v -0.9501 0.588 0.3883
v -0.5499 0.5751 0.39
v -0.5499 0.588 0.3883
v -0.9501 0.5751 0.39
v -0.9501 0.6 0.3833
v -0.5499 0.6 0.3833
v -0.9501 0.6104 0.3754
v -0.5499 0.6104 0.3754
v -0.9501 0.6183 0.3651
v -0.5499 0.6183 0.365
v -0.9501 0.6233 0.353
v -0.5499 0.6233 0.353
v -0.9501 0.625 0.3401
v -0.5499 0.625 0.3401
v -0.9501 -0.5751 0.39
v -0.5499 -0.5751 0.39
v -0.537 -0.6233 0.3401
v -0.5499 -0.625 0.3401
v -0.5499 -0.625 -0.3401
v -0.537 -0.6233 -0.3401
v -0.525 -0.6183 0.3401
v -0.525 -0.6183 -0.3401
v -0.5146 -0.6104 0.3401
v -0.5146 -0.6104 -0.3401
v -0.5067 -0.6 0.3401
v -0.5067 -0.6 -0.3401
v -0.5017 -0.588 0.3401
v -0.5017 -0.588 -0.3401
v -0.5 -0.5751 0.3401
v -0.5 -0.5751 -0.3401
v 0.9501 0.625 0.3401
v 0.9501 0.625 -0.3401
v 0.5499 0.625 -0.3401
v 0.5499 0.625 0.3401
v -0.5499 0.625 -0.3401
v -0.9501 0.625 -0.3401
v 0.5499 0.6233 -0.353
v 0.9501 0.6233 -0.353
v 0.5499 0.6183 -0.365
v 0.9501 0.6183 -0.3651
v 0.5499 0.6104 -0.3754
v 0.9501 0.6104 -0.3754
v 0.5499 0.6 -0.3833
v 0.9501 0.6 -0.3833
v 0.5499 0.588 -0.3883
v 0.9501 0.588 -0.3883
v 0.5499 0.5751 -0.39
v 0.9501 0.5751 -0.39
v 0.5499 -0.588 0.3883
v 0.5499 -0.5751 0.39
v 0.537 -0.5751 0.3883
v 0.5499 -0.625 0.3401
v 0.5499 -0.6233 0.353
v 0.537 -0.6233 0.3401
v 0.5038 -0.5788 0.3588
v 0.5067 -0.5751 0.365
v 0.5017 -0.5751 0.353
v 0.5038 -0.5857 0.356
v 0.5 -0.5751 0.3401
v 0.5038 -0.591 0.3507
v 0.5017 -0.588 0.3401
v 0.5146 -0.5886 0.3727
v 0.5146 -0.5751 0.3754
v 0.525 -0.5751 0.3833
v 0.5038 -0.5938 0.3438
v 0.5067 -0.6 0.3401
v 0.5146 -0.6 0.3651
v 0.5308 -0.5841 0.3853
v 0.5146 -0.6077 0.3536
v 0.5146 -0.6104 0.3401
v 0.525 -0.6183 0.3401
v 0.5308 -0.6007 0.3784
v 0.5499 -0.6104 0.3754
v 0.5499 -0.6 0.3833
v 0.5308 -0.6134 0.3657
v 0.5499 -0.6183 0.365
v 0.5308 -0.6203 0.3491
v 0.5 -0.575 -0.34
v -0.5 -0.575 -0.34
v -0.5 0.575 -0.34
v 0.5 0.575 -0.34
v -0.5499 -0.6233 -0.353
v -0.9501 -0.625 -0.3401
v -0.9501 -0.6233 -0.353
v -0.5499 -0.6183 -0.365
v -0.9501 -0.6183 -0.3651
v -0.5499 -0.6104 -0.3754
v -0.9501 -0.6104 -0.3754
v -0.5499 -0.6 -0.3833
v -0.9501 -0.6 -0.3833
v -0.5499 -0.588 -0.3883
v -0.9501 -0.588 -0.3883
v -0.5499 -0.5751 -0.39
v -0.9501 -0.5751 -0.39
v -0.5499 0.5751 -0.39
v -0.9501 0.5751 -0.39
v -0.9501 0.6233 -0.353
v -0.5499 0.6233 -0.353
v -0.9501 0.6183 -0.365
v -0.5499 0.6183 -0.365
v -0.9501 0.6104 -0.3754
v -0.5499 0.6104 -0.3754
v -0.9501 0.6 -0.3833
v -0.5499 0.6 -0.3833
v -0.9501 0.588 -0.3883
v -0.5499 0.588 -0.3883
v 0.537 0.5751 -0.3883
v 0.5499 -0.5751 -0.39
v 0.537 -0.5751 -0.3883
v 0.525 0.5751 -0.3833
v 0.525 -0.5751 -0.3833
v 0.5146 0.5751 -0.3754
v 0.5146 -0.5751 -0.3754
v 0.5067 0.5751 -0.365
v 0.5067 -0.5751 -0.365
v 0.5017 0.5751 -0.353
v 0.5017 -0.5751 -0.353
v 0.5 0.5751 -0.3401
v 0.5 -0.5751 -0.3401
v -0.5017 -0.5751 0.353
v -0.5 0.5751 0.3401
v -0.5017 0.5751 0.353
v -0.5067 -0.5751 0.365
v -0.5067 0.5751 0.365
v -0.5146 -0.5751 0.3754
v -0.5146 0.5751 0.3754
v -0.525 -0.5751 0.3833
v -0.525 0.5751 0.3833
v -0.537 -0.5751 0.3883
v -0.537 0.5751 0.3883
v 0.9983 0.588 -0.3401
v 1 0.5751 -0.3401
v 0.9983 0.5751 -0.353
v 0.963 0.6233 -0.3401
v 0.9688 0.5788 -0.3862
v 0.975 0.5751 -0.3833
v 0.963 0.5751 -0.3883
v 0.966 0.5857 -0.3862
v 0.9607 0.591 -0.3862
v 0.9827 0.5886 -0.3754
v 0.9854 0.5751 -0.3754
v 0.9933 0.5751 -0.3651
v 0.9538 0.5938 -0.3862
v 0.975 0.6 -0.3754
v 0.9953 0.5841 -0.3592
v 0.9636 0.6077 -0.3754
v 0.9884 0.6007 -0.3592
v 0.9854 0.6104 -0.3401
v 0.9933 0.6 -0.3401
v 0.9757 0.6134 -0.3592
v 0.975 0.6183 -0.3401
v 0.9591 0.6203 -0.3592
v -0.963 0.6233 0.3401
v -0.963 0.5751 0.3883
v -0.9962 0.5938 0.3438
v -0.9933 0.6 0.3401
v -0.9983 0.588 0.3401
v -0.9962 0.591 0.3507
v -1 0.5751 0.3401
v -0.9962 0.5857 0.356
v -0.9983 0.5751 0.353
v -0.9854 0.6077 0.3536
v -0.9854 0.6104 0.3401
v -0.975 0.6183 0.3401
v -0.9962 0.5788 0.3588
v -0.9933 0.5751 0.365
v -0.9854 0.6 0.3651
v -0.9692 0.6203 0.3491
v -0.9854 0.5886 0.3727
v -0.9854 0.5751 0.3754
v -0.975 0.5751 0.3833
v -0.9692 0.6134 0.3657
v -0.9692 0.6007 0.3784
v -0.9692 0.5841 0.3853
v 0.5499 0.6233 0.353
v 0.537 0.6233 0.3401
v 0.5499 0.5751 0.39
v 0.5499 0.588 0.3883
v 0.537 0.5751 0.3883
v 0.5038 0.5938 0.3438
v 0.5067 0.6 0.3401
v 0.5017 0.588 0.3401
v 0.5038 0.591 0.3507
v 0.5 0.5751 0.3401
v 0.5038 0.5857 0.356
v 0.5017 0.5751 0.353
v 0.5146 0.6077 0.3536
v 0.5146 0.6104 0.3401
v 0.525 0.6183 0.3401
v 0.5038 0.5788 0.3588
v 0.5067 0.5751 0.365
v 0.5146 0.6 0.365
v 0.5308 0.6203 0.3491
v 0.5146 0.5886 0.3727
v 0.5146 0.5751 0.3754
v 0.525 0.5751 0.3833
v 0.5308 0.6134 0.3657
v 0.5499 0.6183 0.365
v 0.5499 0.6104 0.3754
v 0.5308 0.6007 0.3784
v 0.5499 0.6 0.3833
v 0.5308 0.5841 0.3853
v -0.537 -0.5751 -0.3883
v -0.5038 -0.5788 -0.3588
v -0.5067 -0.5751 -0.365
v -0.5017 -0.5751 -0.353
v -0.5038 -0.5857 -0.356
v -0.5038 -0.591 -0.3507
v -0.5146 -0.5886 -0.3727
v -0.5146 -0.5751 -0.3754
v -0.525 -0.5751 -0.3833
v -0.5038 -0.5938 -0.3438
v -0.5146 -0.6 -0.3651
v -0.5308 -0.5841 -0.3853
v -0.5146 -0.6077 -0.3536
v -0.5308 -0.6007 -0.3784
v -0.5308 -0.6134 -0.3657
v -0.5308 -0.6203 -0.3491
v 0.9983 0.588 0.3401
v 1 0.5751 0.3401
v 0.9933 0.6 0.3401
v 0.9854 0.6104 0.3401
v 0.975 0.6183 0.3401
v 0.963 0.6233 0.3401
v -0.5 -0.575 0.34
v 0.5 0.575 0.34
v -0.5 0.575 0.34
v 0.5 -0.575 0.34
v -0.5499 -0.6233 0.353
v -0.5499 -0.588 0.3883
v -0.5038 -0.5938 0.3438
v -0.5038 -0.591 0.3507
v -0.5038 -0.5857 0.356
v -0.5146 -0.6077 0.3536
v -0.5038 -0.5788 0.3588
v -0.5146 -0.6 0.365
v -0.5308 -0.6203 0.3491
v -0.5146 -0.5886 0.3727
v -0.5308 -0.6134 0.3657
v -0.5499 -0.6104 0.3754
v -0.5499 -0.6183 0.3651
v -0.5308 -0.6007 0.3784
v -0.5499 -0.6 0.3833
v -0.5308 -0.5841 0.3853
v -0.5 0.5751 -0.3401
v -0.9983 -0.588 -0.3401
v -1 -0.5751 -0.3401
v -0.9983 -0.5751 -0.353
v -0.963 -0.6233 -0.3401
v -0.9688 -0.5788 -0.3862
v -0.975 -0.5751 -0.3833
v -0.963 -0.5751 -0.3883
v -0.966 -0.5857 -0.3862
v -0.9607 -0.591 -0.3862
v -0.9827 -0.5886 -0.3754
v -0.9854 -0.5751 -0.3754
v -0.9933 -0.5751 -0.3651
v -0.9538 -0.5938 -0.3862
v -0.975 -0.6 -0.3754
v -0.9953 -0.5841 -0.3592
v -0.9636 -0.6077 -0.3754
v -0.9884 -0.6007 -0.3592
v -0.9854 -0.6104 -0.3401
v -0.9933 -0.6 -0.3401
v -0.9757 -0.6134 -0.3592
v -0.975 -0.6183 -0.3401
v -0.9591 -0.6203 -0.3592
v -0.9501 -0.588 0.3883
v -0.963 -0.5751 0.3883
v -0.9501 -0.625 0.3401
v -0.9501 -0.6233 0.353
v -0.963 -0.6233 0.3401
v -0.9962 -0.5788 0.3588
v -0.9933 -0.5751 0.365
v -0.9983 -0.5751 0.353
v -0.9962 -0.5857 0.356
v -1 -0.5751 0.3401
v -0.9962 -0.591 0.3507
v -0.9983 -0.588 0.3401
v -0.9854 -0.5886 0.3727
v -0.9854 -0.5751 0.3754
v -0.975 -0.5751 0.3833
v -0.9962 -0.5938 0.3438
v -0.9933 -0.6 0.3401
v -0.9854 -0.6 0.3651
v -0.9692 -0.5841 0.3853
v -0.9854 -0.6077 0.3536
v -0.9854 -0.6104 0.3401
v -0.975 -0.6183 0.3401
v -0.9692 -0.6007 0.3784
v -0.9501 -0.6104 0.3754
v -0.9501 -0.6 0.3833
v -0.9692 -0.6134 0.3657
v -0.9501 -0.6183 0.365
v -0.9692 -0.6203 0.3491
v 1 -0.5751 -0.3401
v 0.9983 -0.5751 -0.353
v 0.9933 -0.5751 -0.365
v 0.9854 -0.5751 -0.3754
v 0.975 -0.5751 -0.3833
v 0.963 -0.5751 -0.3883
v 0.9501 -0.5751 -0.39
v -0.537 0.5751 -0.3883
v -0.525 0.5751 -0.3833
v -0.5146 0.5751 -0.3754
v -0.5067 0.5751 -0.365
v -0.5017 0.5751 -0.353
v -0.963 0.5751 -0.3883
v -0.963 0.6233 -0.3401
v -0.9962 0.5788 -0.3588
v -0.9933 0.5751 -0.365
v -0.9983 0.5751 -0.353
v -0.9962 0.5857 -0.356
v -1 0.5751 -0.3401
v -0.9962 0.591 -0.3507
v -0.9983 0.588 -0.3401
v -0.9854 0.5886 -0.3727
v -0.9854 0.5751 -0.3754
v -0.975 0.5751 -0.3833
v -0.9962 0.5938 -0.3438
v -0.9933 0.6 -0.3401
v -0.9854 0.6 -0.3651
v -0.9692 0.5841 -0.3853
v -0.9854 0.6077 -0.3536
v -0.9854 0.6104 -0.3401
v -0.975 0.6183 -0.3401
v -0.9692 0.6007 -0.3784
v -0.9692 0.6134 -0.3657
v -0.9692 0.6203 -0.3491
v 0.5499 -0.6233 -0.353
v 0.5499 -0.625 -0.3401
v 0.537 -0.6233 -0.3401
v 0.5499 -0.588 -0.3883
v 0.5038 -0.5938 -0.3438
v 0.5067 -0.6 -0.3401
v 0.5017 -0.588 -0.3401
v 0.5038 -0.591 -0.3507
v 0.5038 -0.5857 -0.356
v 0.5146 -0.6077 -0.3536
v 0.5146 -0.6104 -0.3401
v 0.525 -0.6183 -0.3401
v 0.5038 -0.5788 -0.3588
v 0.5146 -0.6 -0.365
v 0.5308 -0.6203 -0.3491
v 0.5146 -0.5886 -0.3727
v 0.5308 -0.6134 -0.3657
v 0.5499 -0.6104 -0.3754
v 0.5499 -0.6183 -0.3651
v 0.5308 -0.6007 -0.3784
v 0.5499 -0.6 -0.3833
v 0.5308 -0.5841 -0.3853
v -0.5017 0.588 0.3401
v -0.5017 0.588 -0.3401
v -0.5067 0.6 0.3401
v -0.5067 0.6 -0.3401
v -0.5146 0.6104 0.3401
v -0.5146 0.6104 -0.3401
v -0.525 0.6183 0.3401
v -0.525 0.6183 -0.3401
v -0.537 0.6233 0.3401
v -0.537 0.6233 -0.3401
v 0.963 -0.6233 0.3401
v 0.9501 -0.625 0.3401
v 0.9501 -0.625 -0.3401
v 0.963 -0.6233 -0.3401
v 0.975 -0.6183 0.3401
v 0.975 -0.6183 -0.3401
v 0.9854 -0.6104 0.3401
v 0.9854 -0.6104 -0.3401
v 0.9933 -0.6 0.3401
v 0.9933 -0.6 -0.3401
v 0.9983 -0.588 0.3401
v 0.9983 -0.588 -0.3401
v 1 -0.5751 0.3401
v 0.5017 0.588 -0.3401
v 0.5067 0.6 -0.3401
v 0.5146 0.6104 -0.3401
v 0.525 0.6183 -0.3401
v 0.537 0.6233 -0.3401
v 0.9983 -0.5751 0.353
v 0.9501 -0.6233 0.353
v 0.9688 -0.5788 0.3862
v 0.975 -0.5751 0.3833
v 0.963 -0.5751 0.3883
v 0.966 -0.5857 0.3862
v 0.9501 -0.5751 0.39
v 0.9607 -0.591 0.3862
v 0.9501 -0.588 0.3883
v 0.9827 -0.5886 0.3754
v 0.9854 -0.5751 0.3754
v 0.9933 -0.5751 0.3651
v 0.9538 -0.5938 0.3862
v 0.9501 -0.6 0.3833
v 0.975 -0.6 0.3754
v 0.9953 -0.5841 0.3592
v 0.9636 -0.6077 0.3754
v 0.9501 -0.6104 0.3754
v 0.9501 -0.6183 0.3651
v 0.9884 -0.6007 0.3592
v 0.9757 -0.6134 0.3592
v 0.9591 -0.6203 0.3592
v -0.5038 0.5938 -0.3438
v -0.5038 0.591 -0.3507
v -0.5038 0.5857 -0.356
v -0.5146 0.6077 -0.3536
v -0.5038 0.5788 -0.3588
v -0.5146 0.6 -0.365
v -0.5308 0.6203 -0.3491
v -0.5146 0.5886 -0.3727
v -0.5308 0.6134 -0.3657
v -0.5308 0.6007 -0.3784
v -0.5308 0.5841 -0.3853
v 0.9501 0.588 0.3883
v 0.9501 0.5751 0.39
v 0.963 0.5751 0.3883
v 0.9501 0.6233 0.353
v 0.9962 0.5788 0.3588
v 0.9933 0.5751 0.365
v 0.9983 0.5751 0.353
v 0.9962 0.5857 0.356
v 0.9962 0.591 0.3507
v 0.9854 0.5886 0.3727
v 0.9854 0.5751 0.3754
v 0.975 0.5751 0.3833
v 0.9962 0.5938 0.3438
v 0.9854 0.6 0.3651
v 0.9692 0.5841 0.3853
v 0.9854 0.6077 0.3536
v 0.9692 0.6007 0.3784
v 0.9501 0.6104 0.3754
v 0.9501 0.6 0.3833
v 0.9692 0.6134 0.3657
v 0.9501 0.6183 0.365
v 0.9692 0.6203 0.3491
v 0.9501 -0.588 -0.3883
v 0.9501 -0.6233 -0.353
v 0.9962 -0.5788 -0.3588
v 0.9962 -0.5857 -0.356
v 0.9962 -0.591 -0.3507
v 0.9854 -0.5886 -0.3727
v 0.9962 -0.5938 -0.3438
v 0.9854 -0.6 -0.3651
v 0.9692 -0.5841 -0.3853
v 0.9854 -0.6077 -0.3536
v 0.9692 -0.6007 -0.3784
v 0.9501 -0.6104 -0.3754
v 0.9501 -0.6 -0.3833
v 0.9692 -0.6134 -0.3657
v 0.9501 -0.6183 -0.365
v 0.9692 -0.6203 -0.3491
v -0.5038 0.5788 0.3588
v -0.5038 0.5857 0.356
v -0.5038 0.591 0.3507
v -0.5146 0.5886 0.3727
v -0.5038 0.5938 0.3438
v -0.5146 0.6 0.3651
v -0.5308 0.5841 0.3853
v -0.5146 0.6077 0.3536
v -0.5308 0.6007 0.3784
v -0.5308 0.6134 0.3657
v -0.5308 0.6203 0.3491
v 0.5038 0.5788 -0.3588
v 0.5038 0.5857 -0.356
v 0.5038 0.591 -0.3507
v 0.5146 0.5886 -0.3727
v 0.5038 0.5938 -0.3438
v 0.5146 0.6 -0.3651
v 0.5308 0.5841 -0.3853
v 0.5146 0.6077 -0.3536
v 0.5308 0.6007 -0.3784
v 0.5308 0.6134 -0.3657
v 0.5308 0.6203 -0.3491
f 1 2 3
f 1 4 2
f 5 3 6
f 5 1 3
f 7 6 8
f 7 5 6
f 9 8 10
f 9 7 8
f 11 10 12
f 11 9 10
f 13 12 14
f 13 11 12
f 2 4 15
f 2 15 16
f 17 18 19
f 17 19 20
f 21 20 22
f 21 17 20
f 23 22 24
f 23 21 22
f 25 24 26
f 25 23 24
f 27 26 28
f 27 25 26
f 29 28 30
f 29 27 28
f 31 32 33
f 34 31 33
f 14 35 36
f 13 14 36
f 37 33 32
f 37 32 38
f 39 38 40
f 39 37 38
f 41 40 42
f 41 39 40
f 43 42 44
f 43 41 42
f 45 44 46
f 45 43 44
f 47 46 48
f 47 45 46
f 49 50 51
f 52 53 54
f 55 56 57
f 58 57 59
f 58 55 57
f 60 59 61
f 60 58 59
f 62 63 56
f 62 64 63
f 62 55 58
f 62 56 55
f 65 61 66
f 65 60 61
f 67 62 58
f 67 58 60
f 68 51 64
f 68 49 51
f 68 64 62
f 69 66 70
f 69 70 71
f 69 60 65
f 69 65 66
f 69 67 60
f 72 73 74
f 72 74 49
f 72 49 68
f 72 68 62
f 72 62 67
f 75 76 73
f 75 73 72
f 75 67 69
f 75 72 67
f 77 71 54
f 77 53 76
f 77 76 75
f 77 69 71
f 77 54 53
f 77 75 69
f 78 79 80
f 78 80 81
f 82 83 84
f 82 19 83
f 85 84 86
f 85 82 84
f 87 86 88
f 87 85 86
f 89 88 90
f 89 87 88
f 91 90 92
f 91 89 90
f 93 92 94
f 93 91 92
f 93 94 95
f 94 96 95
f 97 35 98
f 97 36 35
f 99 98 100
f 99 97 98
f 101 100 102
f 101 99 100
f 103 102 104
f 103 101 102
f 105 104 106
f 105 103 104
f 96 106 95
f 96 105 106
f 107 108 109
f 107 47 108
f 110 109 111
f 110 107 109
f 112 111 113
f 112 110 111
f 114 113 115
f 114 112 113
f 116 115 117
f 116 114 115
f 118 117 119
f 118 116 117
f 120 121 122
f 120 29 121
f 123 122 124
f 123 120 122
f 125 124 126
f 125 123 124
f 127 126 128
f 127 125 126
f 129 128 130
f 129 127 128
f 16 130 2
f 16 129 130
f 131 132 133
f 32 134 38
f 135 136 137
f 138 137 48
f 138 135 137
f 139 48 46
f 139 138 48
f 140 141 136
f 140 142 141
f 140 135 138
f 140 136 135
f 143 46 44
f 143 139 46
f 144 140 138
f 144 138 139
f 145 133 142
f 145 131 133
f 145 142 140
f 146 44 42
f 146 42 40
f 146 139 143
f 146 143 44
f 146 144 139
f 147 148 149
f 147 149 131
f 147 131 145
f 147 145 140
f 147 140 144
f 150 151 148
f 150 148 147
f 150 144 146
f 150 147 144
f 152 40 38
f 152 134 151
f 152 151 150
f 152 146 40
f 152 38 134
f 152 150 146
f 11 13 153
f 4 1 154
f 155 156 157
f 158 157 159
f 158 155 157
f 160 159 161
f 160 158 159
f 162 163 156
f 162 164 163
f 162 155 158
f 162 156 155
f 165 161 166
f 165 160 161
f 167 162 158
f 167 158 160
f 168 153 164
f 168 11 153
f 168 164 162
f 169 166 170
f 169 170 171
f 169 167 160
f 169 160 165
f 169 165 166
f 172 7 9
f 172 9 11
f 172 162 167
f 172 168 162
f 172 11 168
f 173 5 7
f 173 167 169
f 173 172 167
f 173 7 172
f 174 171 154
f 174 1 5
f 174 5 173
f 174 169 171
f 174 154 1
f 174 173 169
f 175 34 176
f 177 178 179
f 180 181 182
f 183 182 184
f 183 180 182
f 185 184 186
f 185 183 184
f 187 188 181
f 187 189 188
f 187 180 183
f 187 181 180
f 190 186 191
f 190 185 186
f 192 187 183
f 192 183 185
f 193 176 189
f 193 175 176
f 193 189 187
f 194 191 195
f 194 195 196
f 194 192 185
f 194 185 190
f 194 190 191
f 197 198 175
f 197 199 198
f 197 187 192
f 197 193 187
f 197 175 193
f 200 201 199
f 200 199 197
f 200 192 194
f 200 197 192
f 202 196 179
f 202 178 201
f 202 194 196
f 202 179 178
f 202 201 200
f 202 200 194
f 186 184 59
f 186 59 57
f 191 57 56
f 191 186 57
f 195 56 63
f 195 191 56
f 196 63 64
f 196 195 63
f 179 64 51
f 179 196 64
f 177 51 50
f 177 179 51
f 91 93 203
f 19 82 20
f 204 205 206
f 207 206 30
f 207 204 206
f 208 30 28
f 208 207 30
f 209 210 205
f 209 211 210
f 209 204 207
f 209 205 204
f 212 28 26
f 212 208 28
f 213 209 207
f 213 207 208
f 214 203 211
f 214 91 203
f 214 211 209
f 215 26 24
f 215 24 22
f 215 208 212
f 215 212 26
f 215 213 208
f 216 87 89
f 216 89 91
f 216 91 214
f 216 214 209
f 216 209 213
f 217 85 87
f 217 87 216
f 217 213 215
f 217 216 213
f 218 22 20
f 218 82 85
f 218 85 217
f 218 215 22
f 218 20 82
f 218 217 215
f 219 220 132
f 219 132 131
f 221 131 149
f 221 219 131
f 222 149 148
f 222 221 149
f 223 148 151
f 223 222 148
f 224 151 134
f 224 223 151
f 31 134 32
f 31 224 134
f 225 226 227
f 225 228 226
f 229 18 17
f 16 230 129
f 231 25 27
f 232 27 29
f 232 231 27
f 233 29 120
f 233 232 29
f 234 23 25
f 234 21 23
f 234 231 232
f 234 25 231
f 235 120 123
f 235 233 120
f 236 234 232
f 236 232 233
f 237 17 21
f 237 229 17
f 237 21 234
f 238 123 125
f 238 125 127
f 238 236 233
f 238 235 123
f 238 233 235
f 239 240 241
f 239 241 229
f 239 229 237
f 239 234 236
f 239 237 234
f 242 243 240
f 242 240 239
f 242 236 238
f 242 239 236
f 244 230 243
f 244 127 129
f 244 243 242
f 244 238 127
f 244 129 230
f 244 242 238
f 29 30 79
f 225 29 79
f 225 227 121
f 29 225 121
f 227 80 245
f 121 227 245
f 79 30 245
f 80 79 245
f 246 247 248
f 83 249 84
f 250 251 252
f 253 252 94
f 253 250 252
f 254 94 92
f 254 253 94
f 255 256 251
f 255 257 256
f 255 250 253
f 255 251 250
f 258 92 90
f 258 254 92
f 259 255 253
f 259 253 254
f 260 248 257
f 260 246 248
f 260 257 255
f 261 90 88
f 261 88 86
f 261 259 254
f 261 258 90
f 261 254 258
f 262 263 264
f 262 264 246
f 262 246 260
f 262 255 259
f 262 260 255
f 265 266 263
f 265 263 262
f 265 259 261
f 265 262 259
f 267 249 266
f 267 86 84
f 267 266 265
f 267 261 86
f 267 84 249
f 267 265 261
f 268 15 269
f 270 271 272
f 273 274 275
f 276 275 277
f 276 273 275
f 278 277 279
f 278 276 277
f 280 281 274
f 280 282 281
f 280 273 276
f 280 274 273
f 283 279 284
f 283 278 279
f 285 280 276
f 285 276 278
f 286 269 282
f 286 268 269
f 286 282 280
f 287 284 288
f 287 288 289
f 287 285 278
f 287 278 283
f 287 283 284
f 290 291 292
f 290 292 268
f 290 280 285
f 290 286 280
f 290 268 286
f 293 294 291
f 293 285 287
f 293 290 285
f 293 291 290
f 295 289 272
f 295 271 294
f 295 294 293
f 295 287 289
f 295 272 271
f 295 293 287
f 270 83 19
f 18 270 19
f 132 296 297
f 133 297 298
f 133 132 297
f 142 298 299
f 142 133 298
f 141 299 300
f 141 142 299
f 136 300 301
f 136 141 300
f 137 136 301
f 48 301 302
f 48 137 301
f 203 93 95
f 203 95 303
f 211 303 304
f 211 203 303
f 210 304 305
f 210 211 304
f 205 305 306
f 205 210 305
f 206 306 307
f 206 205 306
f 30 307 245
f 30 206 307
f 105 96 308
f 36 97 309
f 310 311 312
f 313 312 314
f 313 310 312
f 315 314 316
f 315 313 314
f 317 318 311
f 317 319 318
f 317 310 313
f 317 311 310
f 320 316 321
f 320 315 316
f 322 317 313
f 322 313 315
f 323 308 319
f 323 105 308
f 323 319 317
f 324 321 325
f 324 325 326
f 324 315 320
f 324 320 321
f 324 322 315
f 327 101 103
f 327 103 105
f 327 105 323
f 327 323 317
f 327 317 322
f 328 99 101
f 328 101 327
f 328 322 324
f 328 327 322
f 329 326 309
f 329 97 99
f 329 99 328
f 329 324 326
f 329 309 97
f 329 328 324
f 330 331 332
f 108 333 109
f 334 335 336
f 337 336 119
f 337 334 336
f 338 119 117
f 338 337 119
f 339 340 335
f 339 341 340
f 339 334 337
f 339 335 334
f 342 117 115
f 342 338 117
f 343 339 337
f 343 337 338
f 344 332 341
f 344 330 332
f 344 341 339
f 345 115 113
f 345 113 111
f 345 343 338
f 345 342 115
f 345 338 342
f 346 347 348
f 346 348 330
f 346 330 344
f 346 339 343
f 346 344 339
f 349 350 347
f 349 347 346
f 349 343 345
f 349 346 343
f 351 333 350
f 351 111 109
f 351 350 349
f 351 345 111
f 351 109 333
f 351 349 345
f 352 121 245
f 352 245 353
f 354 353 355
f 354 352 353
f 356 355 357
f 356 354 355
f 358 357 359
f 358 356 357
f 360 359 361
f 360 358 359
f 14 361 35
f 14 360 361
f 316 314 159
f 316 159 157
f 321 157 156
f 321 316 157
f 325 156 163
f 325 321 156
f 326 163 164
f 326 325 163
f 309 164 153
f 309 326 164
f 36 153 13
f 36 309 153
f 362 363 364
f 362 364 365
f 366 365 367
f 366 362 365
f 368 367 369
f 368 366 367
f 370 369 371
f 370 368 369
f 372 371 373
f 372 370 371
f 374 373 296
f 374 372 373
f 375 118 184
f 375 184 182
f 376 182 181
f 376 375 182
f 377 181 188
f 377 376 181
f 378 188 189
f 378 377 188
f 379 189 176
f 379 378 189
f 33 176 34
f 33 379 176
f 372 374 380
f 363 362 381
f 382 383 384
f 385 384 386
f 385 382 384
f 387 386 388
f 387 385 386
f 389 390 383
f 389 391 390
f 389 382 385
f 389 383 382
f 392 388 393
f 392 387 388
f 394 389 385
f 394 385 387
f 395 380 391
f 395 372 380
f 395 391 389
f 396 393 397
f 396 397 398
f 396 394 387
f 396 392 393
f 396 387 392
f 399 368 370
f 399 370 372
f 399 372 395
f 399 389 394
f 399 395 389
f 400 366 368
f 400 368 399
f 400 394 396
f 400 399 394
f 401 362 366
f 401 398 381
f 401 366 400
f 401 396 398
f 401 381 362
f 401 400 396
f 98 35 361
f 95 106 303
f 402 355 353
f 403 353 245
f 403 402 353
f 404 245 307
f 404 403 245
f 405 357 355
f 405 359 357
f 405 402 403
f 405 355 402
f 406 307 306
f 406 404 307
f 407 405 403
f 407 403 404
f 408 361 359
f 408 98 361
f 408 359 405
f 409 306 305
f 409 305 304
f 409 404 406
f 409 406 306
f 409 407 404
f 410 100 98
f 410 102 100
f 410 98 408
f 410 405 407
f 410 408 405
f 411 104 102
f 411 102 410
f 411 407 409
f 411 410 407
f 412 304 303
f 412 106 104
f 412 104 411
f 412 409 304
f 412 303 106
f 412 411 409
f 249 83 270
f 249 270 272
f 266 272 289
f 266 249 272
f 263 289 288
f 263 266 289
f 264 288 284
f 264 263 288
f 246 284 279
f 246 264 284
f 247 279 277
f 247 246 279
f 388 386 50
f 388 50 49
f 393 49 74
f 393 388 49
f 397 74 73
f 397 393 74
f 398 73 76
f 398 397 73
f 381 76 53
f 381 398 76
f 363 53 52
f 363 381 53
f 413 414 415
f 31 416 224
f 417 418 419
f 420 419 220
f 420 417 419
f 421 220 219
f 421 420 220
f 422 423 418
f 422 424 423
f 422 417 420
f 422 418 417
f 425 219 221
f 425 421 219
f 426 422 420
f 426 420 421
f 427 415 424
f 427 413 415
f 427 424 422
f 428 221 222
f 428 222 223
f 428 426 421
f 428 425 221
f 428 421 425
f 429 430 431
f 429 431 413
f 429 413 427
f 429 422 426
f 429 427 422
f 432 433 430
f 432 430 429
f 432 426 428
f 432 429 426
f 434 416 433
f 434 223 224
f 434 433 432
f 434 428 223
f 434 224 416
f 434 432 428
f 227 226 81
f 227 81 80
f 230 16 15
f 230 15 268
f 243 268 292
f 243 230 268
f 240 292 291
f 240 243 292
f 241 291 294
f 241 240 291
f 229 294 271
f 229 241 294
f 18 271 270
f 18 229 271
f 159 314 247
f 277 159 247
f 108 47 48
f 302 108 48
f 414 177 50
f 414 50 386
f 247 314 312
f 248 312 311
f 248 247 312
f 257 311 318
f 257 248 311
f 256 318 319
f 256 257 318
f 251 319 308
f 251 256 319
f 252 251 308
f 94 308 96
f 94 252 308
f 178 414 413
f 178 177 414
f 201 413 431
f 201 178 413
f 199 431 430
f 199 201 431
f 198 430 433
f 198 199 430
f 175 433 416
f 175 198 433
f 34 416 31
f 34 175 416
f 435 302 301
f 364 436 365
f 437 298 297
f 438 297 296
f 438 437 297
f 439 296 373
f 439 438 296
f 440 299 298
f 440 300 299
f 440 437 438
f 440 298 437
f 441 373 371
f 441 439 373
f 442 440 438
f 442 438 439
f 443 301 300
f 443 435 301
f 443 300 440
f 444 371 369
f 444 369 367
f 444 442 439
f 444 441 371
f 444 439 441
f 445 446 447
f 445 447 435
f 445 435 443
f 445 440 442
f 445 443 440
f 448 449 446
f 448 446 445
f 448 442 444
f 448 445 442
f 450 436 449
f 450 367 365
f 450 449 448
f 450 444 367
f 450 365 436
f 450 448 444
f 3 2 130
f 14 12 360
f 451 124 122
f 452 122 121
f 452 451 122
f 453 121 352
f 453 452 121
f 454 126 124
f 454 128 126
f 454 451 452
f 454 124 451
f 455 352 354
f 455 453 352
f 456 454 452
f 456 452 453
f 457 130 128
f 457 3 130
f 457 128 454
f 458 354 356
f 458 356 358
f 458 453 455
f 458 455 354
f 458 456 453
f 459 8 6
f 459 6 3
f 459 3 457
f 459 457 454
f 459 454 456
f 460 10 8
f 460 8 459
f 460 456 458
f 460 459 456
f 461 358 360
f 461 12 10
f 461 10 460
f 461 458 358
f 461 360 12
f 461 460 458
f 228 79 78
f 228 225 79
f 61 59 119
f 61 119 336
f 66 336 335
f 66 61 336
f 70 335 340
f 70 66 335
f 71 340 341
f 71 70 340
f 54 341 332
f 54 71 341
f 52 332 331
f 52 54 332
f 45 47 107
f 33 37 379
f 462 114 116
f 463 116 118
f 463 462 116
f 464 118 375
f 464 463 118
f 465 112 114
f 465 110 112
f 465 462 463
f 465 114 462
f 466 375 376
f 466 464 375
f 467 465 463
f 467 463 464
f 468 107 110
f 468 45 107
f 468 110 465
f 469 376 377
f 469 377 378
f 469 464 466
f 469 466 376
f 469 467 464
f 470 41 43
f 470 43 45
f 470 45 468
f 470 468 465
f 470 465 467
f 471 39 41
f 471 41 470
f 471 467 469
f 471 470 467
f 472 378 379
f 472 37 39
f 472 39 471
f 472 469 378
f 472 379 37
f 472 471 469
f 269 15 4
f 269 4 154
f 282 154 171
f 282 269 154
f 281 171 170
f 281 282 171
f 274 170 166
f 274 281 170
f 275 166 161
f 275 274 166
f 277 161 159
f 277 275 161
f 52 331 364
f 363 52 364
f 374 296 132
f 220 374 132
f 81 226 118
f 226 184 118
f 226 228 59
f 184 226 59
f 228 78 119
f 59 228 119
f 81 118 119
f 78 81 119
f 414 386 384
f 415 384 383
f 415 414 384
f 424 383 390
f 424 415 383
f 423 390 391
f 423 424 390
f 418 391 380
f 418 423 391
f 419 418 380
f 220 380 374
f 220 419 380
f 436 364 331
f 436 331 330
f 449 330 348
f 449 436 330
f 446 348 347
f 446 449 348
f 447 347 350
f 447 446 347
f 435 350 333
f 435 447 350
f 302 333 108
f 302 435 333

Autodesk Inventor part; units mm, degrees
ref_plane "YZ Plane" through (0, 0, 0) normal (1, 0, 0) x (0, 1, 0)
ref_plane "XZ Plane" through (0, 0, 0) normal (0, 1, 0) x (-1, 0, 0)
ref_plane "XY Plane" through (0, 0, 0) normal (0, 0, 1) x (1, 0, 0)
sketch "Sketch1" plane through (0, 0, 0) normal (0, 0, 1) x (1, 0, 0)
  line L0 (1, 0.625) -> (-1, 0.625)
  line L1 (-1, 0.625) -> (-1, -0.625)
  line L2 (-1, -0.625) -> (1, -0.625)
  line L3 (1, -0.625) -> (1, 0.625)
  line L4 (1, 0.625) -> (-1, -0.625) construction
  line L5 (-1, 0.625) -> (1, -0.625) construction
  point P0 (0, 0)
  dimension "d0" = 2
  dimension "d1" = 1.25
sketch "Sketch1 outline for Extrusion1" plane through (0, 0, 0) normal (0, 0, 1) x (1, 0, 0)
  line L0 (1, -0.625) -> (1, 0.625)
  line L1 (-1, -0.625) -> (1, -0.625)
  line L2 (-1, 0.625) -> (-1, -0.625)
  line L3 (1, 0.625) -> (-1, 0.625)
extrude "Extrusion1" add sketch "Sketch1 outline for Extrusion1" along normal mid plane 0.78
sketch "Sketch2" plane through (0, 0, 0.39) normal (0, 0, 1) x (-1, 0, 0)
  line L0 (0.5, 0.624281) -> (0.5, -0.625)
  line L1 (-0.5, 0.625) -> (-0.5, -0.625)
  line L2 (-0.5, 0.625) -> (0.5, 0.625)
  line L3 (0.5, 0.625) -> (0.5, -0.625)
  line L4 (0.5, -0.625) -> (-0.5, -0.625)
  line L5 (-0.5, -0.625) -> (-0.5, 0.625)
  line L6 (-1, -0.625) -> (1, -0.625)
  line L7 (1, 0.625) -> (-1, 0.625)
  line L8 (1, -0.625) -> (1, 0.625)
  line L9 (-1, 0.625) -> (-1, -0.625)
  point P0 (0, 0)
  dimension "d11" = 0.5
  dimension "d12" = 0.5
sketch "Sketch2 outline for Extrusion2" plane through (0, 0, 0.39) normal (0, 0, 1) x (-1, 0, 0)
  line L0 (-0.5, -0.625) -> (0.5, -0.625)
  line L1 (-0.5, 0.625) -> (-0.5, -0.625)
  line L2 (0.5, 0.625) -> (-0.5, 0.625)
  line L3 (0.5, -0.625) -> (0.5, 0.625)
extrude "Extrusion2" cut sketch "Sketch2 outline for Extrusion2" against normal blind 0.05
mirror "Mirror1" about plane through (0, 0, 0) normal (0, 0, 1) of "Extrusion2"
sketch "Sketch3" plane through (1, -0.625, -0.39) normal (0, -1, 0) x (1, 0, 0)
  line L0 (-1.5, 0.73) -> (-0.5, 0.73)
  line L1 (-0.5, 0.73) -> (-0.5, 0.05)
  line L2 (-0.5, 0.05) -> (-1.5, 0.05)
  line L3 (-1.5, 0.05) -> (-1.5, 0.73)
  point P0 (-1, 0.39)
sketch "Sketch3 outline for Extrusion3" plane through (1, -0.625, -0.39) normal (0, -1, 0) x (1, 0, 0)
  line L0 (-1.5, 0.73) -> (-0.5, 0.73)
  line L1 (-0.5, 0.73) -> (-0.5, 0.05)
  line L2 (-0.5, 0.05) -> (-1.5, 0.05)
  line L3 (-1.5, 0.05) -> (-1.5, 0.73)
extrude "Extrusion3" cut sketch "Sketch3 outline for Extrusion3" against normal blind 0.05
mirror "Mirror2" about plane through (0, 0, 0) normal (0, 1, 0) of "Extrusion3"
fillet "Fillet1" radius 0.05 24 edges at (0.75, 0.625, 0.39) (1, 0.625, 0) (0.75, 0.625, -0.39) (0.75, -0.625, -0.39) (1, -0.625, 0) (0.75, -0.625, 0.39) (-0.75, -0.625, 0.39) (-1, -0.625, 0) (-0.75, -0.625, -0.39) (1, 0, -0.39) (1, 0, 0.39) (-0.75, 0.625, 0.39) (-1, 0, 0.39) (-0.75, 0.625, -0.39) (-1, 0.625, 0) (-1, 0, -0.39) (-0.5, 0.625, 0) (-0.5, 0, 0.39) (-0.5, -0.625, 0) (-0.5, 0, -0.39) (0.5, 0.625, 0) (0.5, 0, -0.39) (0.5, -0.625, 0) (0.5, 0, 0.39)
properties part number "C0805C102K5RACTU"
